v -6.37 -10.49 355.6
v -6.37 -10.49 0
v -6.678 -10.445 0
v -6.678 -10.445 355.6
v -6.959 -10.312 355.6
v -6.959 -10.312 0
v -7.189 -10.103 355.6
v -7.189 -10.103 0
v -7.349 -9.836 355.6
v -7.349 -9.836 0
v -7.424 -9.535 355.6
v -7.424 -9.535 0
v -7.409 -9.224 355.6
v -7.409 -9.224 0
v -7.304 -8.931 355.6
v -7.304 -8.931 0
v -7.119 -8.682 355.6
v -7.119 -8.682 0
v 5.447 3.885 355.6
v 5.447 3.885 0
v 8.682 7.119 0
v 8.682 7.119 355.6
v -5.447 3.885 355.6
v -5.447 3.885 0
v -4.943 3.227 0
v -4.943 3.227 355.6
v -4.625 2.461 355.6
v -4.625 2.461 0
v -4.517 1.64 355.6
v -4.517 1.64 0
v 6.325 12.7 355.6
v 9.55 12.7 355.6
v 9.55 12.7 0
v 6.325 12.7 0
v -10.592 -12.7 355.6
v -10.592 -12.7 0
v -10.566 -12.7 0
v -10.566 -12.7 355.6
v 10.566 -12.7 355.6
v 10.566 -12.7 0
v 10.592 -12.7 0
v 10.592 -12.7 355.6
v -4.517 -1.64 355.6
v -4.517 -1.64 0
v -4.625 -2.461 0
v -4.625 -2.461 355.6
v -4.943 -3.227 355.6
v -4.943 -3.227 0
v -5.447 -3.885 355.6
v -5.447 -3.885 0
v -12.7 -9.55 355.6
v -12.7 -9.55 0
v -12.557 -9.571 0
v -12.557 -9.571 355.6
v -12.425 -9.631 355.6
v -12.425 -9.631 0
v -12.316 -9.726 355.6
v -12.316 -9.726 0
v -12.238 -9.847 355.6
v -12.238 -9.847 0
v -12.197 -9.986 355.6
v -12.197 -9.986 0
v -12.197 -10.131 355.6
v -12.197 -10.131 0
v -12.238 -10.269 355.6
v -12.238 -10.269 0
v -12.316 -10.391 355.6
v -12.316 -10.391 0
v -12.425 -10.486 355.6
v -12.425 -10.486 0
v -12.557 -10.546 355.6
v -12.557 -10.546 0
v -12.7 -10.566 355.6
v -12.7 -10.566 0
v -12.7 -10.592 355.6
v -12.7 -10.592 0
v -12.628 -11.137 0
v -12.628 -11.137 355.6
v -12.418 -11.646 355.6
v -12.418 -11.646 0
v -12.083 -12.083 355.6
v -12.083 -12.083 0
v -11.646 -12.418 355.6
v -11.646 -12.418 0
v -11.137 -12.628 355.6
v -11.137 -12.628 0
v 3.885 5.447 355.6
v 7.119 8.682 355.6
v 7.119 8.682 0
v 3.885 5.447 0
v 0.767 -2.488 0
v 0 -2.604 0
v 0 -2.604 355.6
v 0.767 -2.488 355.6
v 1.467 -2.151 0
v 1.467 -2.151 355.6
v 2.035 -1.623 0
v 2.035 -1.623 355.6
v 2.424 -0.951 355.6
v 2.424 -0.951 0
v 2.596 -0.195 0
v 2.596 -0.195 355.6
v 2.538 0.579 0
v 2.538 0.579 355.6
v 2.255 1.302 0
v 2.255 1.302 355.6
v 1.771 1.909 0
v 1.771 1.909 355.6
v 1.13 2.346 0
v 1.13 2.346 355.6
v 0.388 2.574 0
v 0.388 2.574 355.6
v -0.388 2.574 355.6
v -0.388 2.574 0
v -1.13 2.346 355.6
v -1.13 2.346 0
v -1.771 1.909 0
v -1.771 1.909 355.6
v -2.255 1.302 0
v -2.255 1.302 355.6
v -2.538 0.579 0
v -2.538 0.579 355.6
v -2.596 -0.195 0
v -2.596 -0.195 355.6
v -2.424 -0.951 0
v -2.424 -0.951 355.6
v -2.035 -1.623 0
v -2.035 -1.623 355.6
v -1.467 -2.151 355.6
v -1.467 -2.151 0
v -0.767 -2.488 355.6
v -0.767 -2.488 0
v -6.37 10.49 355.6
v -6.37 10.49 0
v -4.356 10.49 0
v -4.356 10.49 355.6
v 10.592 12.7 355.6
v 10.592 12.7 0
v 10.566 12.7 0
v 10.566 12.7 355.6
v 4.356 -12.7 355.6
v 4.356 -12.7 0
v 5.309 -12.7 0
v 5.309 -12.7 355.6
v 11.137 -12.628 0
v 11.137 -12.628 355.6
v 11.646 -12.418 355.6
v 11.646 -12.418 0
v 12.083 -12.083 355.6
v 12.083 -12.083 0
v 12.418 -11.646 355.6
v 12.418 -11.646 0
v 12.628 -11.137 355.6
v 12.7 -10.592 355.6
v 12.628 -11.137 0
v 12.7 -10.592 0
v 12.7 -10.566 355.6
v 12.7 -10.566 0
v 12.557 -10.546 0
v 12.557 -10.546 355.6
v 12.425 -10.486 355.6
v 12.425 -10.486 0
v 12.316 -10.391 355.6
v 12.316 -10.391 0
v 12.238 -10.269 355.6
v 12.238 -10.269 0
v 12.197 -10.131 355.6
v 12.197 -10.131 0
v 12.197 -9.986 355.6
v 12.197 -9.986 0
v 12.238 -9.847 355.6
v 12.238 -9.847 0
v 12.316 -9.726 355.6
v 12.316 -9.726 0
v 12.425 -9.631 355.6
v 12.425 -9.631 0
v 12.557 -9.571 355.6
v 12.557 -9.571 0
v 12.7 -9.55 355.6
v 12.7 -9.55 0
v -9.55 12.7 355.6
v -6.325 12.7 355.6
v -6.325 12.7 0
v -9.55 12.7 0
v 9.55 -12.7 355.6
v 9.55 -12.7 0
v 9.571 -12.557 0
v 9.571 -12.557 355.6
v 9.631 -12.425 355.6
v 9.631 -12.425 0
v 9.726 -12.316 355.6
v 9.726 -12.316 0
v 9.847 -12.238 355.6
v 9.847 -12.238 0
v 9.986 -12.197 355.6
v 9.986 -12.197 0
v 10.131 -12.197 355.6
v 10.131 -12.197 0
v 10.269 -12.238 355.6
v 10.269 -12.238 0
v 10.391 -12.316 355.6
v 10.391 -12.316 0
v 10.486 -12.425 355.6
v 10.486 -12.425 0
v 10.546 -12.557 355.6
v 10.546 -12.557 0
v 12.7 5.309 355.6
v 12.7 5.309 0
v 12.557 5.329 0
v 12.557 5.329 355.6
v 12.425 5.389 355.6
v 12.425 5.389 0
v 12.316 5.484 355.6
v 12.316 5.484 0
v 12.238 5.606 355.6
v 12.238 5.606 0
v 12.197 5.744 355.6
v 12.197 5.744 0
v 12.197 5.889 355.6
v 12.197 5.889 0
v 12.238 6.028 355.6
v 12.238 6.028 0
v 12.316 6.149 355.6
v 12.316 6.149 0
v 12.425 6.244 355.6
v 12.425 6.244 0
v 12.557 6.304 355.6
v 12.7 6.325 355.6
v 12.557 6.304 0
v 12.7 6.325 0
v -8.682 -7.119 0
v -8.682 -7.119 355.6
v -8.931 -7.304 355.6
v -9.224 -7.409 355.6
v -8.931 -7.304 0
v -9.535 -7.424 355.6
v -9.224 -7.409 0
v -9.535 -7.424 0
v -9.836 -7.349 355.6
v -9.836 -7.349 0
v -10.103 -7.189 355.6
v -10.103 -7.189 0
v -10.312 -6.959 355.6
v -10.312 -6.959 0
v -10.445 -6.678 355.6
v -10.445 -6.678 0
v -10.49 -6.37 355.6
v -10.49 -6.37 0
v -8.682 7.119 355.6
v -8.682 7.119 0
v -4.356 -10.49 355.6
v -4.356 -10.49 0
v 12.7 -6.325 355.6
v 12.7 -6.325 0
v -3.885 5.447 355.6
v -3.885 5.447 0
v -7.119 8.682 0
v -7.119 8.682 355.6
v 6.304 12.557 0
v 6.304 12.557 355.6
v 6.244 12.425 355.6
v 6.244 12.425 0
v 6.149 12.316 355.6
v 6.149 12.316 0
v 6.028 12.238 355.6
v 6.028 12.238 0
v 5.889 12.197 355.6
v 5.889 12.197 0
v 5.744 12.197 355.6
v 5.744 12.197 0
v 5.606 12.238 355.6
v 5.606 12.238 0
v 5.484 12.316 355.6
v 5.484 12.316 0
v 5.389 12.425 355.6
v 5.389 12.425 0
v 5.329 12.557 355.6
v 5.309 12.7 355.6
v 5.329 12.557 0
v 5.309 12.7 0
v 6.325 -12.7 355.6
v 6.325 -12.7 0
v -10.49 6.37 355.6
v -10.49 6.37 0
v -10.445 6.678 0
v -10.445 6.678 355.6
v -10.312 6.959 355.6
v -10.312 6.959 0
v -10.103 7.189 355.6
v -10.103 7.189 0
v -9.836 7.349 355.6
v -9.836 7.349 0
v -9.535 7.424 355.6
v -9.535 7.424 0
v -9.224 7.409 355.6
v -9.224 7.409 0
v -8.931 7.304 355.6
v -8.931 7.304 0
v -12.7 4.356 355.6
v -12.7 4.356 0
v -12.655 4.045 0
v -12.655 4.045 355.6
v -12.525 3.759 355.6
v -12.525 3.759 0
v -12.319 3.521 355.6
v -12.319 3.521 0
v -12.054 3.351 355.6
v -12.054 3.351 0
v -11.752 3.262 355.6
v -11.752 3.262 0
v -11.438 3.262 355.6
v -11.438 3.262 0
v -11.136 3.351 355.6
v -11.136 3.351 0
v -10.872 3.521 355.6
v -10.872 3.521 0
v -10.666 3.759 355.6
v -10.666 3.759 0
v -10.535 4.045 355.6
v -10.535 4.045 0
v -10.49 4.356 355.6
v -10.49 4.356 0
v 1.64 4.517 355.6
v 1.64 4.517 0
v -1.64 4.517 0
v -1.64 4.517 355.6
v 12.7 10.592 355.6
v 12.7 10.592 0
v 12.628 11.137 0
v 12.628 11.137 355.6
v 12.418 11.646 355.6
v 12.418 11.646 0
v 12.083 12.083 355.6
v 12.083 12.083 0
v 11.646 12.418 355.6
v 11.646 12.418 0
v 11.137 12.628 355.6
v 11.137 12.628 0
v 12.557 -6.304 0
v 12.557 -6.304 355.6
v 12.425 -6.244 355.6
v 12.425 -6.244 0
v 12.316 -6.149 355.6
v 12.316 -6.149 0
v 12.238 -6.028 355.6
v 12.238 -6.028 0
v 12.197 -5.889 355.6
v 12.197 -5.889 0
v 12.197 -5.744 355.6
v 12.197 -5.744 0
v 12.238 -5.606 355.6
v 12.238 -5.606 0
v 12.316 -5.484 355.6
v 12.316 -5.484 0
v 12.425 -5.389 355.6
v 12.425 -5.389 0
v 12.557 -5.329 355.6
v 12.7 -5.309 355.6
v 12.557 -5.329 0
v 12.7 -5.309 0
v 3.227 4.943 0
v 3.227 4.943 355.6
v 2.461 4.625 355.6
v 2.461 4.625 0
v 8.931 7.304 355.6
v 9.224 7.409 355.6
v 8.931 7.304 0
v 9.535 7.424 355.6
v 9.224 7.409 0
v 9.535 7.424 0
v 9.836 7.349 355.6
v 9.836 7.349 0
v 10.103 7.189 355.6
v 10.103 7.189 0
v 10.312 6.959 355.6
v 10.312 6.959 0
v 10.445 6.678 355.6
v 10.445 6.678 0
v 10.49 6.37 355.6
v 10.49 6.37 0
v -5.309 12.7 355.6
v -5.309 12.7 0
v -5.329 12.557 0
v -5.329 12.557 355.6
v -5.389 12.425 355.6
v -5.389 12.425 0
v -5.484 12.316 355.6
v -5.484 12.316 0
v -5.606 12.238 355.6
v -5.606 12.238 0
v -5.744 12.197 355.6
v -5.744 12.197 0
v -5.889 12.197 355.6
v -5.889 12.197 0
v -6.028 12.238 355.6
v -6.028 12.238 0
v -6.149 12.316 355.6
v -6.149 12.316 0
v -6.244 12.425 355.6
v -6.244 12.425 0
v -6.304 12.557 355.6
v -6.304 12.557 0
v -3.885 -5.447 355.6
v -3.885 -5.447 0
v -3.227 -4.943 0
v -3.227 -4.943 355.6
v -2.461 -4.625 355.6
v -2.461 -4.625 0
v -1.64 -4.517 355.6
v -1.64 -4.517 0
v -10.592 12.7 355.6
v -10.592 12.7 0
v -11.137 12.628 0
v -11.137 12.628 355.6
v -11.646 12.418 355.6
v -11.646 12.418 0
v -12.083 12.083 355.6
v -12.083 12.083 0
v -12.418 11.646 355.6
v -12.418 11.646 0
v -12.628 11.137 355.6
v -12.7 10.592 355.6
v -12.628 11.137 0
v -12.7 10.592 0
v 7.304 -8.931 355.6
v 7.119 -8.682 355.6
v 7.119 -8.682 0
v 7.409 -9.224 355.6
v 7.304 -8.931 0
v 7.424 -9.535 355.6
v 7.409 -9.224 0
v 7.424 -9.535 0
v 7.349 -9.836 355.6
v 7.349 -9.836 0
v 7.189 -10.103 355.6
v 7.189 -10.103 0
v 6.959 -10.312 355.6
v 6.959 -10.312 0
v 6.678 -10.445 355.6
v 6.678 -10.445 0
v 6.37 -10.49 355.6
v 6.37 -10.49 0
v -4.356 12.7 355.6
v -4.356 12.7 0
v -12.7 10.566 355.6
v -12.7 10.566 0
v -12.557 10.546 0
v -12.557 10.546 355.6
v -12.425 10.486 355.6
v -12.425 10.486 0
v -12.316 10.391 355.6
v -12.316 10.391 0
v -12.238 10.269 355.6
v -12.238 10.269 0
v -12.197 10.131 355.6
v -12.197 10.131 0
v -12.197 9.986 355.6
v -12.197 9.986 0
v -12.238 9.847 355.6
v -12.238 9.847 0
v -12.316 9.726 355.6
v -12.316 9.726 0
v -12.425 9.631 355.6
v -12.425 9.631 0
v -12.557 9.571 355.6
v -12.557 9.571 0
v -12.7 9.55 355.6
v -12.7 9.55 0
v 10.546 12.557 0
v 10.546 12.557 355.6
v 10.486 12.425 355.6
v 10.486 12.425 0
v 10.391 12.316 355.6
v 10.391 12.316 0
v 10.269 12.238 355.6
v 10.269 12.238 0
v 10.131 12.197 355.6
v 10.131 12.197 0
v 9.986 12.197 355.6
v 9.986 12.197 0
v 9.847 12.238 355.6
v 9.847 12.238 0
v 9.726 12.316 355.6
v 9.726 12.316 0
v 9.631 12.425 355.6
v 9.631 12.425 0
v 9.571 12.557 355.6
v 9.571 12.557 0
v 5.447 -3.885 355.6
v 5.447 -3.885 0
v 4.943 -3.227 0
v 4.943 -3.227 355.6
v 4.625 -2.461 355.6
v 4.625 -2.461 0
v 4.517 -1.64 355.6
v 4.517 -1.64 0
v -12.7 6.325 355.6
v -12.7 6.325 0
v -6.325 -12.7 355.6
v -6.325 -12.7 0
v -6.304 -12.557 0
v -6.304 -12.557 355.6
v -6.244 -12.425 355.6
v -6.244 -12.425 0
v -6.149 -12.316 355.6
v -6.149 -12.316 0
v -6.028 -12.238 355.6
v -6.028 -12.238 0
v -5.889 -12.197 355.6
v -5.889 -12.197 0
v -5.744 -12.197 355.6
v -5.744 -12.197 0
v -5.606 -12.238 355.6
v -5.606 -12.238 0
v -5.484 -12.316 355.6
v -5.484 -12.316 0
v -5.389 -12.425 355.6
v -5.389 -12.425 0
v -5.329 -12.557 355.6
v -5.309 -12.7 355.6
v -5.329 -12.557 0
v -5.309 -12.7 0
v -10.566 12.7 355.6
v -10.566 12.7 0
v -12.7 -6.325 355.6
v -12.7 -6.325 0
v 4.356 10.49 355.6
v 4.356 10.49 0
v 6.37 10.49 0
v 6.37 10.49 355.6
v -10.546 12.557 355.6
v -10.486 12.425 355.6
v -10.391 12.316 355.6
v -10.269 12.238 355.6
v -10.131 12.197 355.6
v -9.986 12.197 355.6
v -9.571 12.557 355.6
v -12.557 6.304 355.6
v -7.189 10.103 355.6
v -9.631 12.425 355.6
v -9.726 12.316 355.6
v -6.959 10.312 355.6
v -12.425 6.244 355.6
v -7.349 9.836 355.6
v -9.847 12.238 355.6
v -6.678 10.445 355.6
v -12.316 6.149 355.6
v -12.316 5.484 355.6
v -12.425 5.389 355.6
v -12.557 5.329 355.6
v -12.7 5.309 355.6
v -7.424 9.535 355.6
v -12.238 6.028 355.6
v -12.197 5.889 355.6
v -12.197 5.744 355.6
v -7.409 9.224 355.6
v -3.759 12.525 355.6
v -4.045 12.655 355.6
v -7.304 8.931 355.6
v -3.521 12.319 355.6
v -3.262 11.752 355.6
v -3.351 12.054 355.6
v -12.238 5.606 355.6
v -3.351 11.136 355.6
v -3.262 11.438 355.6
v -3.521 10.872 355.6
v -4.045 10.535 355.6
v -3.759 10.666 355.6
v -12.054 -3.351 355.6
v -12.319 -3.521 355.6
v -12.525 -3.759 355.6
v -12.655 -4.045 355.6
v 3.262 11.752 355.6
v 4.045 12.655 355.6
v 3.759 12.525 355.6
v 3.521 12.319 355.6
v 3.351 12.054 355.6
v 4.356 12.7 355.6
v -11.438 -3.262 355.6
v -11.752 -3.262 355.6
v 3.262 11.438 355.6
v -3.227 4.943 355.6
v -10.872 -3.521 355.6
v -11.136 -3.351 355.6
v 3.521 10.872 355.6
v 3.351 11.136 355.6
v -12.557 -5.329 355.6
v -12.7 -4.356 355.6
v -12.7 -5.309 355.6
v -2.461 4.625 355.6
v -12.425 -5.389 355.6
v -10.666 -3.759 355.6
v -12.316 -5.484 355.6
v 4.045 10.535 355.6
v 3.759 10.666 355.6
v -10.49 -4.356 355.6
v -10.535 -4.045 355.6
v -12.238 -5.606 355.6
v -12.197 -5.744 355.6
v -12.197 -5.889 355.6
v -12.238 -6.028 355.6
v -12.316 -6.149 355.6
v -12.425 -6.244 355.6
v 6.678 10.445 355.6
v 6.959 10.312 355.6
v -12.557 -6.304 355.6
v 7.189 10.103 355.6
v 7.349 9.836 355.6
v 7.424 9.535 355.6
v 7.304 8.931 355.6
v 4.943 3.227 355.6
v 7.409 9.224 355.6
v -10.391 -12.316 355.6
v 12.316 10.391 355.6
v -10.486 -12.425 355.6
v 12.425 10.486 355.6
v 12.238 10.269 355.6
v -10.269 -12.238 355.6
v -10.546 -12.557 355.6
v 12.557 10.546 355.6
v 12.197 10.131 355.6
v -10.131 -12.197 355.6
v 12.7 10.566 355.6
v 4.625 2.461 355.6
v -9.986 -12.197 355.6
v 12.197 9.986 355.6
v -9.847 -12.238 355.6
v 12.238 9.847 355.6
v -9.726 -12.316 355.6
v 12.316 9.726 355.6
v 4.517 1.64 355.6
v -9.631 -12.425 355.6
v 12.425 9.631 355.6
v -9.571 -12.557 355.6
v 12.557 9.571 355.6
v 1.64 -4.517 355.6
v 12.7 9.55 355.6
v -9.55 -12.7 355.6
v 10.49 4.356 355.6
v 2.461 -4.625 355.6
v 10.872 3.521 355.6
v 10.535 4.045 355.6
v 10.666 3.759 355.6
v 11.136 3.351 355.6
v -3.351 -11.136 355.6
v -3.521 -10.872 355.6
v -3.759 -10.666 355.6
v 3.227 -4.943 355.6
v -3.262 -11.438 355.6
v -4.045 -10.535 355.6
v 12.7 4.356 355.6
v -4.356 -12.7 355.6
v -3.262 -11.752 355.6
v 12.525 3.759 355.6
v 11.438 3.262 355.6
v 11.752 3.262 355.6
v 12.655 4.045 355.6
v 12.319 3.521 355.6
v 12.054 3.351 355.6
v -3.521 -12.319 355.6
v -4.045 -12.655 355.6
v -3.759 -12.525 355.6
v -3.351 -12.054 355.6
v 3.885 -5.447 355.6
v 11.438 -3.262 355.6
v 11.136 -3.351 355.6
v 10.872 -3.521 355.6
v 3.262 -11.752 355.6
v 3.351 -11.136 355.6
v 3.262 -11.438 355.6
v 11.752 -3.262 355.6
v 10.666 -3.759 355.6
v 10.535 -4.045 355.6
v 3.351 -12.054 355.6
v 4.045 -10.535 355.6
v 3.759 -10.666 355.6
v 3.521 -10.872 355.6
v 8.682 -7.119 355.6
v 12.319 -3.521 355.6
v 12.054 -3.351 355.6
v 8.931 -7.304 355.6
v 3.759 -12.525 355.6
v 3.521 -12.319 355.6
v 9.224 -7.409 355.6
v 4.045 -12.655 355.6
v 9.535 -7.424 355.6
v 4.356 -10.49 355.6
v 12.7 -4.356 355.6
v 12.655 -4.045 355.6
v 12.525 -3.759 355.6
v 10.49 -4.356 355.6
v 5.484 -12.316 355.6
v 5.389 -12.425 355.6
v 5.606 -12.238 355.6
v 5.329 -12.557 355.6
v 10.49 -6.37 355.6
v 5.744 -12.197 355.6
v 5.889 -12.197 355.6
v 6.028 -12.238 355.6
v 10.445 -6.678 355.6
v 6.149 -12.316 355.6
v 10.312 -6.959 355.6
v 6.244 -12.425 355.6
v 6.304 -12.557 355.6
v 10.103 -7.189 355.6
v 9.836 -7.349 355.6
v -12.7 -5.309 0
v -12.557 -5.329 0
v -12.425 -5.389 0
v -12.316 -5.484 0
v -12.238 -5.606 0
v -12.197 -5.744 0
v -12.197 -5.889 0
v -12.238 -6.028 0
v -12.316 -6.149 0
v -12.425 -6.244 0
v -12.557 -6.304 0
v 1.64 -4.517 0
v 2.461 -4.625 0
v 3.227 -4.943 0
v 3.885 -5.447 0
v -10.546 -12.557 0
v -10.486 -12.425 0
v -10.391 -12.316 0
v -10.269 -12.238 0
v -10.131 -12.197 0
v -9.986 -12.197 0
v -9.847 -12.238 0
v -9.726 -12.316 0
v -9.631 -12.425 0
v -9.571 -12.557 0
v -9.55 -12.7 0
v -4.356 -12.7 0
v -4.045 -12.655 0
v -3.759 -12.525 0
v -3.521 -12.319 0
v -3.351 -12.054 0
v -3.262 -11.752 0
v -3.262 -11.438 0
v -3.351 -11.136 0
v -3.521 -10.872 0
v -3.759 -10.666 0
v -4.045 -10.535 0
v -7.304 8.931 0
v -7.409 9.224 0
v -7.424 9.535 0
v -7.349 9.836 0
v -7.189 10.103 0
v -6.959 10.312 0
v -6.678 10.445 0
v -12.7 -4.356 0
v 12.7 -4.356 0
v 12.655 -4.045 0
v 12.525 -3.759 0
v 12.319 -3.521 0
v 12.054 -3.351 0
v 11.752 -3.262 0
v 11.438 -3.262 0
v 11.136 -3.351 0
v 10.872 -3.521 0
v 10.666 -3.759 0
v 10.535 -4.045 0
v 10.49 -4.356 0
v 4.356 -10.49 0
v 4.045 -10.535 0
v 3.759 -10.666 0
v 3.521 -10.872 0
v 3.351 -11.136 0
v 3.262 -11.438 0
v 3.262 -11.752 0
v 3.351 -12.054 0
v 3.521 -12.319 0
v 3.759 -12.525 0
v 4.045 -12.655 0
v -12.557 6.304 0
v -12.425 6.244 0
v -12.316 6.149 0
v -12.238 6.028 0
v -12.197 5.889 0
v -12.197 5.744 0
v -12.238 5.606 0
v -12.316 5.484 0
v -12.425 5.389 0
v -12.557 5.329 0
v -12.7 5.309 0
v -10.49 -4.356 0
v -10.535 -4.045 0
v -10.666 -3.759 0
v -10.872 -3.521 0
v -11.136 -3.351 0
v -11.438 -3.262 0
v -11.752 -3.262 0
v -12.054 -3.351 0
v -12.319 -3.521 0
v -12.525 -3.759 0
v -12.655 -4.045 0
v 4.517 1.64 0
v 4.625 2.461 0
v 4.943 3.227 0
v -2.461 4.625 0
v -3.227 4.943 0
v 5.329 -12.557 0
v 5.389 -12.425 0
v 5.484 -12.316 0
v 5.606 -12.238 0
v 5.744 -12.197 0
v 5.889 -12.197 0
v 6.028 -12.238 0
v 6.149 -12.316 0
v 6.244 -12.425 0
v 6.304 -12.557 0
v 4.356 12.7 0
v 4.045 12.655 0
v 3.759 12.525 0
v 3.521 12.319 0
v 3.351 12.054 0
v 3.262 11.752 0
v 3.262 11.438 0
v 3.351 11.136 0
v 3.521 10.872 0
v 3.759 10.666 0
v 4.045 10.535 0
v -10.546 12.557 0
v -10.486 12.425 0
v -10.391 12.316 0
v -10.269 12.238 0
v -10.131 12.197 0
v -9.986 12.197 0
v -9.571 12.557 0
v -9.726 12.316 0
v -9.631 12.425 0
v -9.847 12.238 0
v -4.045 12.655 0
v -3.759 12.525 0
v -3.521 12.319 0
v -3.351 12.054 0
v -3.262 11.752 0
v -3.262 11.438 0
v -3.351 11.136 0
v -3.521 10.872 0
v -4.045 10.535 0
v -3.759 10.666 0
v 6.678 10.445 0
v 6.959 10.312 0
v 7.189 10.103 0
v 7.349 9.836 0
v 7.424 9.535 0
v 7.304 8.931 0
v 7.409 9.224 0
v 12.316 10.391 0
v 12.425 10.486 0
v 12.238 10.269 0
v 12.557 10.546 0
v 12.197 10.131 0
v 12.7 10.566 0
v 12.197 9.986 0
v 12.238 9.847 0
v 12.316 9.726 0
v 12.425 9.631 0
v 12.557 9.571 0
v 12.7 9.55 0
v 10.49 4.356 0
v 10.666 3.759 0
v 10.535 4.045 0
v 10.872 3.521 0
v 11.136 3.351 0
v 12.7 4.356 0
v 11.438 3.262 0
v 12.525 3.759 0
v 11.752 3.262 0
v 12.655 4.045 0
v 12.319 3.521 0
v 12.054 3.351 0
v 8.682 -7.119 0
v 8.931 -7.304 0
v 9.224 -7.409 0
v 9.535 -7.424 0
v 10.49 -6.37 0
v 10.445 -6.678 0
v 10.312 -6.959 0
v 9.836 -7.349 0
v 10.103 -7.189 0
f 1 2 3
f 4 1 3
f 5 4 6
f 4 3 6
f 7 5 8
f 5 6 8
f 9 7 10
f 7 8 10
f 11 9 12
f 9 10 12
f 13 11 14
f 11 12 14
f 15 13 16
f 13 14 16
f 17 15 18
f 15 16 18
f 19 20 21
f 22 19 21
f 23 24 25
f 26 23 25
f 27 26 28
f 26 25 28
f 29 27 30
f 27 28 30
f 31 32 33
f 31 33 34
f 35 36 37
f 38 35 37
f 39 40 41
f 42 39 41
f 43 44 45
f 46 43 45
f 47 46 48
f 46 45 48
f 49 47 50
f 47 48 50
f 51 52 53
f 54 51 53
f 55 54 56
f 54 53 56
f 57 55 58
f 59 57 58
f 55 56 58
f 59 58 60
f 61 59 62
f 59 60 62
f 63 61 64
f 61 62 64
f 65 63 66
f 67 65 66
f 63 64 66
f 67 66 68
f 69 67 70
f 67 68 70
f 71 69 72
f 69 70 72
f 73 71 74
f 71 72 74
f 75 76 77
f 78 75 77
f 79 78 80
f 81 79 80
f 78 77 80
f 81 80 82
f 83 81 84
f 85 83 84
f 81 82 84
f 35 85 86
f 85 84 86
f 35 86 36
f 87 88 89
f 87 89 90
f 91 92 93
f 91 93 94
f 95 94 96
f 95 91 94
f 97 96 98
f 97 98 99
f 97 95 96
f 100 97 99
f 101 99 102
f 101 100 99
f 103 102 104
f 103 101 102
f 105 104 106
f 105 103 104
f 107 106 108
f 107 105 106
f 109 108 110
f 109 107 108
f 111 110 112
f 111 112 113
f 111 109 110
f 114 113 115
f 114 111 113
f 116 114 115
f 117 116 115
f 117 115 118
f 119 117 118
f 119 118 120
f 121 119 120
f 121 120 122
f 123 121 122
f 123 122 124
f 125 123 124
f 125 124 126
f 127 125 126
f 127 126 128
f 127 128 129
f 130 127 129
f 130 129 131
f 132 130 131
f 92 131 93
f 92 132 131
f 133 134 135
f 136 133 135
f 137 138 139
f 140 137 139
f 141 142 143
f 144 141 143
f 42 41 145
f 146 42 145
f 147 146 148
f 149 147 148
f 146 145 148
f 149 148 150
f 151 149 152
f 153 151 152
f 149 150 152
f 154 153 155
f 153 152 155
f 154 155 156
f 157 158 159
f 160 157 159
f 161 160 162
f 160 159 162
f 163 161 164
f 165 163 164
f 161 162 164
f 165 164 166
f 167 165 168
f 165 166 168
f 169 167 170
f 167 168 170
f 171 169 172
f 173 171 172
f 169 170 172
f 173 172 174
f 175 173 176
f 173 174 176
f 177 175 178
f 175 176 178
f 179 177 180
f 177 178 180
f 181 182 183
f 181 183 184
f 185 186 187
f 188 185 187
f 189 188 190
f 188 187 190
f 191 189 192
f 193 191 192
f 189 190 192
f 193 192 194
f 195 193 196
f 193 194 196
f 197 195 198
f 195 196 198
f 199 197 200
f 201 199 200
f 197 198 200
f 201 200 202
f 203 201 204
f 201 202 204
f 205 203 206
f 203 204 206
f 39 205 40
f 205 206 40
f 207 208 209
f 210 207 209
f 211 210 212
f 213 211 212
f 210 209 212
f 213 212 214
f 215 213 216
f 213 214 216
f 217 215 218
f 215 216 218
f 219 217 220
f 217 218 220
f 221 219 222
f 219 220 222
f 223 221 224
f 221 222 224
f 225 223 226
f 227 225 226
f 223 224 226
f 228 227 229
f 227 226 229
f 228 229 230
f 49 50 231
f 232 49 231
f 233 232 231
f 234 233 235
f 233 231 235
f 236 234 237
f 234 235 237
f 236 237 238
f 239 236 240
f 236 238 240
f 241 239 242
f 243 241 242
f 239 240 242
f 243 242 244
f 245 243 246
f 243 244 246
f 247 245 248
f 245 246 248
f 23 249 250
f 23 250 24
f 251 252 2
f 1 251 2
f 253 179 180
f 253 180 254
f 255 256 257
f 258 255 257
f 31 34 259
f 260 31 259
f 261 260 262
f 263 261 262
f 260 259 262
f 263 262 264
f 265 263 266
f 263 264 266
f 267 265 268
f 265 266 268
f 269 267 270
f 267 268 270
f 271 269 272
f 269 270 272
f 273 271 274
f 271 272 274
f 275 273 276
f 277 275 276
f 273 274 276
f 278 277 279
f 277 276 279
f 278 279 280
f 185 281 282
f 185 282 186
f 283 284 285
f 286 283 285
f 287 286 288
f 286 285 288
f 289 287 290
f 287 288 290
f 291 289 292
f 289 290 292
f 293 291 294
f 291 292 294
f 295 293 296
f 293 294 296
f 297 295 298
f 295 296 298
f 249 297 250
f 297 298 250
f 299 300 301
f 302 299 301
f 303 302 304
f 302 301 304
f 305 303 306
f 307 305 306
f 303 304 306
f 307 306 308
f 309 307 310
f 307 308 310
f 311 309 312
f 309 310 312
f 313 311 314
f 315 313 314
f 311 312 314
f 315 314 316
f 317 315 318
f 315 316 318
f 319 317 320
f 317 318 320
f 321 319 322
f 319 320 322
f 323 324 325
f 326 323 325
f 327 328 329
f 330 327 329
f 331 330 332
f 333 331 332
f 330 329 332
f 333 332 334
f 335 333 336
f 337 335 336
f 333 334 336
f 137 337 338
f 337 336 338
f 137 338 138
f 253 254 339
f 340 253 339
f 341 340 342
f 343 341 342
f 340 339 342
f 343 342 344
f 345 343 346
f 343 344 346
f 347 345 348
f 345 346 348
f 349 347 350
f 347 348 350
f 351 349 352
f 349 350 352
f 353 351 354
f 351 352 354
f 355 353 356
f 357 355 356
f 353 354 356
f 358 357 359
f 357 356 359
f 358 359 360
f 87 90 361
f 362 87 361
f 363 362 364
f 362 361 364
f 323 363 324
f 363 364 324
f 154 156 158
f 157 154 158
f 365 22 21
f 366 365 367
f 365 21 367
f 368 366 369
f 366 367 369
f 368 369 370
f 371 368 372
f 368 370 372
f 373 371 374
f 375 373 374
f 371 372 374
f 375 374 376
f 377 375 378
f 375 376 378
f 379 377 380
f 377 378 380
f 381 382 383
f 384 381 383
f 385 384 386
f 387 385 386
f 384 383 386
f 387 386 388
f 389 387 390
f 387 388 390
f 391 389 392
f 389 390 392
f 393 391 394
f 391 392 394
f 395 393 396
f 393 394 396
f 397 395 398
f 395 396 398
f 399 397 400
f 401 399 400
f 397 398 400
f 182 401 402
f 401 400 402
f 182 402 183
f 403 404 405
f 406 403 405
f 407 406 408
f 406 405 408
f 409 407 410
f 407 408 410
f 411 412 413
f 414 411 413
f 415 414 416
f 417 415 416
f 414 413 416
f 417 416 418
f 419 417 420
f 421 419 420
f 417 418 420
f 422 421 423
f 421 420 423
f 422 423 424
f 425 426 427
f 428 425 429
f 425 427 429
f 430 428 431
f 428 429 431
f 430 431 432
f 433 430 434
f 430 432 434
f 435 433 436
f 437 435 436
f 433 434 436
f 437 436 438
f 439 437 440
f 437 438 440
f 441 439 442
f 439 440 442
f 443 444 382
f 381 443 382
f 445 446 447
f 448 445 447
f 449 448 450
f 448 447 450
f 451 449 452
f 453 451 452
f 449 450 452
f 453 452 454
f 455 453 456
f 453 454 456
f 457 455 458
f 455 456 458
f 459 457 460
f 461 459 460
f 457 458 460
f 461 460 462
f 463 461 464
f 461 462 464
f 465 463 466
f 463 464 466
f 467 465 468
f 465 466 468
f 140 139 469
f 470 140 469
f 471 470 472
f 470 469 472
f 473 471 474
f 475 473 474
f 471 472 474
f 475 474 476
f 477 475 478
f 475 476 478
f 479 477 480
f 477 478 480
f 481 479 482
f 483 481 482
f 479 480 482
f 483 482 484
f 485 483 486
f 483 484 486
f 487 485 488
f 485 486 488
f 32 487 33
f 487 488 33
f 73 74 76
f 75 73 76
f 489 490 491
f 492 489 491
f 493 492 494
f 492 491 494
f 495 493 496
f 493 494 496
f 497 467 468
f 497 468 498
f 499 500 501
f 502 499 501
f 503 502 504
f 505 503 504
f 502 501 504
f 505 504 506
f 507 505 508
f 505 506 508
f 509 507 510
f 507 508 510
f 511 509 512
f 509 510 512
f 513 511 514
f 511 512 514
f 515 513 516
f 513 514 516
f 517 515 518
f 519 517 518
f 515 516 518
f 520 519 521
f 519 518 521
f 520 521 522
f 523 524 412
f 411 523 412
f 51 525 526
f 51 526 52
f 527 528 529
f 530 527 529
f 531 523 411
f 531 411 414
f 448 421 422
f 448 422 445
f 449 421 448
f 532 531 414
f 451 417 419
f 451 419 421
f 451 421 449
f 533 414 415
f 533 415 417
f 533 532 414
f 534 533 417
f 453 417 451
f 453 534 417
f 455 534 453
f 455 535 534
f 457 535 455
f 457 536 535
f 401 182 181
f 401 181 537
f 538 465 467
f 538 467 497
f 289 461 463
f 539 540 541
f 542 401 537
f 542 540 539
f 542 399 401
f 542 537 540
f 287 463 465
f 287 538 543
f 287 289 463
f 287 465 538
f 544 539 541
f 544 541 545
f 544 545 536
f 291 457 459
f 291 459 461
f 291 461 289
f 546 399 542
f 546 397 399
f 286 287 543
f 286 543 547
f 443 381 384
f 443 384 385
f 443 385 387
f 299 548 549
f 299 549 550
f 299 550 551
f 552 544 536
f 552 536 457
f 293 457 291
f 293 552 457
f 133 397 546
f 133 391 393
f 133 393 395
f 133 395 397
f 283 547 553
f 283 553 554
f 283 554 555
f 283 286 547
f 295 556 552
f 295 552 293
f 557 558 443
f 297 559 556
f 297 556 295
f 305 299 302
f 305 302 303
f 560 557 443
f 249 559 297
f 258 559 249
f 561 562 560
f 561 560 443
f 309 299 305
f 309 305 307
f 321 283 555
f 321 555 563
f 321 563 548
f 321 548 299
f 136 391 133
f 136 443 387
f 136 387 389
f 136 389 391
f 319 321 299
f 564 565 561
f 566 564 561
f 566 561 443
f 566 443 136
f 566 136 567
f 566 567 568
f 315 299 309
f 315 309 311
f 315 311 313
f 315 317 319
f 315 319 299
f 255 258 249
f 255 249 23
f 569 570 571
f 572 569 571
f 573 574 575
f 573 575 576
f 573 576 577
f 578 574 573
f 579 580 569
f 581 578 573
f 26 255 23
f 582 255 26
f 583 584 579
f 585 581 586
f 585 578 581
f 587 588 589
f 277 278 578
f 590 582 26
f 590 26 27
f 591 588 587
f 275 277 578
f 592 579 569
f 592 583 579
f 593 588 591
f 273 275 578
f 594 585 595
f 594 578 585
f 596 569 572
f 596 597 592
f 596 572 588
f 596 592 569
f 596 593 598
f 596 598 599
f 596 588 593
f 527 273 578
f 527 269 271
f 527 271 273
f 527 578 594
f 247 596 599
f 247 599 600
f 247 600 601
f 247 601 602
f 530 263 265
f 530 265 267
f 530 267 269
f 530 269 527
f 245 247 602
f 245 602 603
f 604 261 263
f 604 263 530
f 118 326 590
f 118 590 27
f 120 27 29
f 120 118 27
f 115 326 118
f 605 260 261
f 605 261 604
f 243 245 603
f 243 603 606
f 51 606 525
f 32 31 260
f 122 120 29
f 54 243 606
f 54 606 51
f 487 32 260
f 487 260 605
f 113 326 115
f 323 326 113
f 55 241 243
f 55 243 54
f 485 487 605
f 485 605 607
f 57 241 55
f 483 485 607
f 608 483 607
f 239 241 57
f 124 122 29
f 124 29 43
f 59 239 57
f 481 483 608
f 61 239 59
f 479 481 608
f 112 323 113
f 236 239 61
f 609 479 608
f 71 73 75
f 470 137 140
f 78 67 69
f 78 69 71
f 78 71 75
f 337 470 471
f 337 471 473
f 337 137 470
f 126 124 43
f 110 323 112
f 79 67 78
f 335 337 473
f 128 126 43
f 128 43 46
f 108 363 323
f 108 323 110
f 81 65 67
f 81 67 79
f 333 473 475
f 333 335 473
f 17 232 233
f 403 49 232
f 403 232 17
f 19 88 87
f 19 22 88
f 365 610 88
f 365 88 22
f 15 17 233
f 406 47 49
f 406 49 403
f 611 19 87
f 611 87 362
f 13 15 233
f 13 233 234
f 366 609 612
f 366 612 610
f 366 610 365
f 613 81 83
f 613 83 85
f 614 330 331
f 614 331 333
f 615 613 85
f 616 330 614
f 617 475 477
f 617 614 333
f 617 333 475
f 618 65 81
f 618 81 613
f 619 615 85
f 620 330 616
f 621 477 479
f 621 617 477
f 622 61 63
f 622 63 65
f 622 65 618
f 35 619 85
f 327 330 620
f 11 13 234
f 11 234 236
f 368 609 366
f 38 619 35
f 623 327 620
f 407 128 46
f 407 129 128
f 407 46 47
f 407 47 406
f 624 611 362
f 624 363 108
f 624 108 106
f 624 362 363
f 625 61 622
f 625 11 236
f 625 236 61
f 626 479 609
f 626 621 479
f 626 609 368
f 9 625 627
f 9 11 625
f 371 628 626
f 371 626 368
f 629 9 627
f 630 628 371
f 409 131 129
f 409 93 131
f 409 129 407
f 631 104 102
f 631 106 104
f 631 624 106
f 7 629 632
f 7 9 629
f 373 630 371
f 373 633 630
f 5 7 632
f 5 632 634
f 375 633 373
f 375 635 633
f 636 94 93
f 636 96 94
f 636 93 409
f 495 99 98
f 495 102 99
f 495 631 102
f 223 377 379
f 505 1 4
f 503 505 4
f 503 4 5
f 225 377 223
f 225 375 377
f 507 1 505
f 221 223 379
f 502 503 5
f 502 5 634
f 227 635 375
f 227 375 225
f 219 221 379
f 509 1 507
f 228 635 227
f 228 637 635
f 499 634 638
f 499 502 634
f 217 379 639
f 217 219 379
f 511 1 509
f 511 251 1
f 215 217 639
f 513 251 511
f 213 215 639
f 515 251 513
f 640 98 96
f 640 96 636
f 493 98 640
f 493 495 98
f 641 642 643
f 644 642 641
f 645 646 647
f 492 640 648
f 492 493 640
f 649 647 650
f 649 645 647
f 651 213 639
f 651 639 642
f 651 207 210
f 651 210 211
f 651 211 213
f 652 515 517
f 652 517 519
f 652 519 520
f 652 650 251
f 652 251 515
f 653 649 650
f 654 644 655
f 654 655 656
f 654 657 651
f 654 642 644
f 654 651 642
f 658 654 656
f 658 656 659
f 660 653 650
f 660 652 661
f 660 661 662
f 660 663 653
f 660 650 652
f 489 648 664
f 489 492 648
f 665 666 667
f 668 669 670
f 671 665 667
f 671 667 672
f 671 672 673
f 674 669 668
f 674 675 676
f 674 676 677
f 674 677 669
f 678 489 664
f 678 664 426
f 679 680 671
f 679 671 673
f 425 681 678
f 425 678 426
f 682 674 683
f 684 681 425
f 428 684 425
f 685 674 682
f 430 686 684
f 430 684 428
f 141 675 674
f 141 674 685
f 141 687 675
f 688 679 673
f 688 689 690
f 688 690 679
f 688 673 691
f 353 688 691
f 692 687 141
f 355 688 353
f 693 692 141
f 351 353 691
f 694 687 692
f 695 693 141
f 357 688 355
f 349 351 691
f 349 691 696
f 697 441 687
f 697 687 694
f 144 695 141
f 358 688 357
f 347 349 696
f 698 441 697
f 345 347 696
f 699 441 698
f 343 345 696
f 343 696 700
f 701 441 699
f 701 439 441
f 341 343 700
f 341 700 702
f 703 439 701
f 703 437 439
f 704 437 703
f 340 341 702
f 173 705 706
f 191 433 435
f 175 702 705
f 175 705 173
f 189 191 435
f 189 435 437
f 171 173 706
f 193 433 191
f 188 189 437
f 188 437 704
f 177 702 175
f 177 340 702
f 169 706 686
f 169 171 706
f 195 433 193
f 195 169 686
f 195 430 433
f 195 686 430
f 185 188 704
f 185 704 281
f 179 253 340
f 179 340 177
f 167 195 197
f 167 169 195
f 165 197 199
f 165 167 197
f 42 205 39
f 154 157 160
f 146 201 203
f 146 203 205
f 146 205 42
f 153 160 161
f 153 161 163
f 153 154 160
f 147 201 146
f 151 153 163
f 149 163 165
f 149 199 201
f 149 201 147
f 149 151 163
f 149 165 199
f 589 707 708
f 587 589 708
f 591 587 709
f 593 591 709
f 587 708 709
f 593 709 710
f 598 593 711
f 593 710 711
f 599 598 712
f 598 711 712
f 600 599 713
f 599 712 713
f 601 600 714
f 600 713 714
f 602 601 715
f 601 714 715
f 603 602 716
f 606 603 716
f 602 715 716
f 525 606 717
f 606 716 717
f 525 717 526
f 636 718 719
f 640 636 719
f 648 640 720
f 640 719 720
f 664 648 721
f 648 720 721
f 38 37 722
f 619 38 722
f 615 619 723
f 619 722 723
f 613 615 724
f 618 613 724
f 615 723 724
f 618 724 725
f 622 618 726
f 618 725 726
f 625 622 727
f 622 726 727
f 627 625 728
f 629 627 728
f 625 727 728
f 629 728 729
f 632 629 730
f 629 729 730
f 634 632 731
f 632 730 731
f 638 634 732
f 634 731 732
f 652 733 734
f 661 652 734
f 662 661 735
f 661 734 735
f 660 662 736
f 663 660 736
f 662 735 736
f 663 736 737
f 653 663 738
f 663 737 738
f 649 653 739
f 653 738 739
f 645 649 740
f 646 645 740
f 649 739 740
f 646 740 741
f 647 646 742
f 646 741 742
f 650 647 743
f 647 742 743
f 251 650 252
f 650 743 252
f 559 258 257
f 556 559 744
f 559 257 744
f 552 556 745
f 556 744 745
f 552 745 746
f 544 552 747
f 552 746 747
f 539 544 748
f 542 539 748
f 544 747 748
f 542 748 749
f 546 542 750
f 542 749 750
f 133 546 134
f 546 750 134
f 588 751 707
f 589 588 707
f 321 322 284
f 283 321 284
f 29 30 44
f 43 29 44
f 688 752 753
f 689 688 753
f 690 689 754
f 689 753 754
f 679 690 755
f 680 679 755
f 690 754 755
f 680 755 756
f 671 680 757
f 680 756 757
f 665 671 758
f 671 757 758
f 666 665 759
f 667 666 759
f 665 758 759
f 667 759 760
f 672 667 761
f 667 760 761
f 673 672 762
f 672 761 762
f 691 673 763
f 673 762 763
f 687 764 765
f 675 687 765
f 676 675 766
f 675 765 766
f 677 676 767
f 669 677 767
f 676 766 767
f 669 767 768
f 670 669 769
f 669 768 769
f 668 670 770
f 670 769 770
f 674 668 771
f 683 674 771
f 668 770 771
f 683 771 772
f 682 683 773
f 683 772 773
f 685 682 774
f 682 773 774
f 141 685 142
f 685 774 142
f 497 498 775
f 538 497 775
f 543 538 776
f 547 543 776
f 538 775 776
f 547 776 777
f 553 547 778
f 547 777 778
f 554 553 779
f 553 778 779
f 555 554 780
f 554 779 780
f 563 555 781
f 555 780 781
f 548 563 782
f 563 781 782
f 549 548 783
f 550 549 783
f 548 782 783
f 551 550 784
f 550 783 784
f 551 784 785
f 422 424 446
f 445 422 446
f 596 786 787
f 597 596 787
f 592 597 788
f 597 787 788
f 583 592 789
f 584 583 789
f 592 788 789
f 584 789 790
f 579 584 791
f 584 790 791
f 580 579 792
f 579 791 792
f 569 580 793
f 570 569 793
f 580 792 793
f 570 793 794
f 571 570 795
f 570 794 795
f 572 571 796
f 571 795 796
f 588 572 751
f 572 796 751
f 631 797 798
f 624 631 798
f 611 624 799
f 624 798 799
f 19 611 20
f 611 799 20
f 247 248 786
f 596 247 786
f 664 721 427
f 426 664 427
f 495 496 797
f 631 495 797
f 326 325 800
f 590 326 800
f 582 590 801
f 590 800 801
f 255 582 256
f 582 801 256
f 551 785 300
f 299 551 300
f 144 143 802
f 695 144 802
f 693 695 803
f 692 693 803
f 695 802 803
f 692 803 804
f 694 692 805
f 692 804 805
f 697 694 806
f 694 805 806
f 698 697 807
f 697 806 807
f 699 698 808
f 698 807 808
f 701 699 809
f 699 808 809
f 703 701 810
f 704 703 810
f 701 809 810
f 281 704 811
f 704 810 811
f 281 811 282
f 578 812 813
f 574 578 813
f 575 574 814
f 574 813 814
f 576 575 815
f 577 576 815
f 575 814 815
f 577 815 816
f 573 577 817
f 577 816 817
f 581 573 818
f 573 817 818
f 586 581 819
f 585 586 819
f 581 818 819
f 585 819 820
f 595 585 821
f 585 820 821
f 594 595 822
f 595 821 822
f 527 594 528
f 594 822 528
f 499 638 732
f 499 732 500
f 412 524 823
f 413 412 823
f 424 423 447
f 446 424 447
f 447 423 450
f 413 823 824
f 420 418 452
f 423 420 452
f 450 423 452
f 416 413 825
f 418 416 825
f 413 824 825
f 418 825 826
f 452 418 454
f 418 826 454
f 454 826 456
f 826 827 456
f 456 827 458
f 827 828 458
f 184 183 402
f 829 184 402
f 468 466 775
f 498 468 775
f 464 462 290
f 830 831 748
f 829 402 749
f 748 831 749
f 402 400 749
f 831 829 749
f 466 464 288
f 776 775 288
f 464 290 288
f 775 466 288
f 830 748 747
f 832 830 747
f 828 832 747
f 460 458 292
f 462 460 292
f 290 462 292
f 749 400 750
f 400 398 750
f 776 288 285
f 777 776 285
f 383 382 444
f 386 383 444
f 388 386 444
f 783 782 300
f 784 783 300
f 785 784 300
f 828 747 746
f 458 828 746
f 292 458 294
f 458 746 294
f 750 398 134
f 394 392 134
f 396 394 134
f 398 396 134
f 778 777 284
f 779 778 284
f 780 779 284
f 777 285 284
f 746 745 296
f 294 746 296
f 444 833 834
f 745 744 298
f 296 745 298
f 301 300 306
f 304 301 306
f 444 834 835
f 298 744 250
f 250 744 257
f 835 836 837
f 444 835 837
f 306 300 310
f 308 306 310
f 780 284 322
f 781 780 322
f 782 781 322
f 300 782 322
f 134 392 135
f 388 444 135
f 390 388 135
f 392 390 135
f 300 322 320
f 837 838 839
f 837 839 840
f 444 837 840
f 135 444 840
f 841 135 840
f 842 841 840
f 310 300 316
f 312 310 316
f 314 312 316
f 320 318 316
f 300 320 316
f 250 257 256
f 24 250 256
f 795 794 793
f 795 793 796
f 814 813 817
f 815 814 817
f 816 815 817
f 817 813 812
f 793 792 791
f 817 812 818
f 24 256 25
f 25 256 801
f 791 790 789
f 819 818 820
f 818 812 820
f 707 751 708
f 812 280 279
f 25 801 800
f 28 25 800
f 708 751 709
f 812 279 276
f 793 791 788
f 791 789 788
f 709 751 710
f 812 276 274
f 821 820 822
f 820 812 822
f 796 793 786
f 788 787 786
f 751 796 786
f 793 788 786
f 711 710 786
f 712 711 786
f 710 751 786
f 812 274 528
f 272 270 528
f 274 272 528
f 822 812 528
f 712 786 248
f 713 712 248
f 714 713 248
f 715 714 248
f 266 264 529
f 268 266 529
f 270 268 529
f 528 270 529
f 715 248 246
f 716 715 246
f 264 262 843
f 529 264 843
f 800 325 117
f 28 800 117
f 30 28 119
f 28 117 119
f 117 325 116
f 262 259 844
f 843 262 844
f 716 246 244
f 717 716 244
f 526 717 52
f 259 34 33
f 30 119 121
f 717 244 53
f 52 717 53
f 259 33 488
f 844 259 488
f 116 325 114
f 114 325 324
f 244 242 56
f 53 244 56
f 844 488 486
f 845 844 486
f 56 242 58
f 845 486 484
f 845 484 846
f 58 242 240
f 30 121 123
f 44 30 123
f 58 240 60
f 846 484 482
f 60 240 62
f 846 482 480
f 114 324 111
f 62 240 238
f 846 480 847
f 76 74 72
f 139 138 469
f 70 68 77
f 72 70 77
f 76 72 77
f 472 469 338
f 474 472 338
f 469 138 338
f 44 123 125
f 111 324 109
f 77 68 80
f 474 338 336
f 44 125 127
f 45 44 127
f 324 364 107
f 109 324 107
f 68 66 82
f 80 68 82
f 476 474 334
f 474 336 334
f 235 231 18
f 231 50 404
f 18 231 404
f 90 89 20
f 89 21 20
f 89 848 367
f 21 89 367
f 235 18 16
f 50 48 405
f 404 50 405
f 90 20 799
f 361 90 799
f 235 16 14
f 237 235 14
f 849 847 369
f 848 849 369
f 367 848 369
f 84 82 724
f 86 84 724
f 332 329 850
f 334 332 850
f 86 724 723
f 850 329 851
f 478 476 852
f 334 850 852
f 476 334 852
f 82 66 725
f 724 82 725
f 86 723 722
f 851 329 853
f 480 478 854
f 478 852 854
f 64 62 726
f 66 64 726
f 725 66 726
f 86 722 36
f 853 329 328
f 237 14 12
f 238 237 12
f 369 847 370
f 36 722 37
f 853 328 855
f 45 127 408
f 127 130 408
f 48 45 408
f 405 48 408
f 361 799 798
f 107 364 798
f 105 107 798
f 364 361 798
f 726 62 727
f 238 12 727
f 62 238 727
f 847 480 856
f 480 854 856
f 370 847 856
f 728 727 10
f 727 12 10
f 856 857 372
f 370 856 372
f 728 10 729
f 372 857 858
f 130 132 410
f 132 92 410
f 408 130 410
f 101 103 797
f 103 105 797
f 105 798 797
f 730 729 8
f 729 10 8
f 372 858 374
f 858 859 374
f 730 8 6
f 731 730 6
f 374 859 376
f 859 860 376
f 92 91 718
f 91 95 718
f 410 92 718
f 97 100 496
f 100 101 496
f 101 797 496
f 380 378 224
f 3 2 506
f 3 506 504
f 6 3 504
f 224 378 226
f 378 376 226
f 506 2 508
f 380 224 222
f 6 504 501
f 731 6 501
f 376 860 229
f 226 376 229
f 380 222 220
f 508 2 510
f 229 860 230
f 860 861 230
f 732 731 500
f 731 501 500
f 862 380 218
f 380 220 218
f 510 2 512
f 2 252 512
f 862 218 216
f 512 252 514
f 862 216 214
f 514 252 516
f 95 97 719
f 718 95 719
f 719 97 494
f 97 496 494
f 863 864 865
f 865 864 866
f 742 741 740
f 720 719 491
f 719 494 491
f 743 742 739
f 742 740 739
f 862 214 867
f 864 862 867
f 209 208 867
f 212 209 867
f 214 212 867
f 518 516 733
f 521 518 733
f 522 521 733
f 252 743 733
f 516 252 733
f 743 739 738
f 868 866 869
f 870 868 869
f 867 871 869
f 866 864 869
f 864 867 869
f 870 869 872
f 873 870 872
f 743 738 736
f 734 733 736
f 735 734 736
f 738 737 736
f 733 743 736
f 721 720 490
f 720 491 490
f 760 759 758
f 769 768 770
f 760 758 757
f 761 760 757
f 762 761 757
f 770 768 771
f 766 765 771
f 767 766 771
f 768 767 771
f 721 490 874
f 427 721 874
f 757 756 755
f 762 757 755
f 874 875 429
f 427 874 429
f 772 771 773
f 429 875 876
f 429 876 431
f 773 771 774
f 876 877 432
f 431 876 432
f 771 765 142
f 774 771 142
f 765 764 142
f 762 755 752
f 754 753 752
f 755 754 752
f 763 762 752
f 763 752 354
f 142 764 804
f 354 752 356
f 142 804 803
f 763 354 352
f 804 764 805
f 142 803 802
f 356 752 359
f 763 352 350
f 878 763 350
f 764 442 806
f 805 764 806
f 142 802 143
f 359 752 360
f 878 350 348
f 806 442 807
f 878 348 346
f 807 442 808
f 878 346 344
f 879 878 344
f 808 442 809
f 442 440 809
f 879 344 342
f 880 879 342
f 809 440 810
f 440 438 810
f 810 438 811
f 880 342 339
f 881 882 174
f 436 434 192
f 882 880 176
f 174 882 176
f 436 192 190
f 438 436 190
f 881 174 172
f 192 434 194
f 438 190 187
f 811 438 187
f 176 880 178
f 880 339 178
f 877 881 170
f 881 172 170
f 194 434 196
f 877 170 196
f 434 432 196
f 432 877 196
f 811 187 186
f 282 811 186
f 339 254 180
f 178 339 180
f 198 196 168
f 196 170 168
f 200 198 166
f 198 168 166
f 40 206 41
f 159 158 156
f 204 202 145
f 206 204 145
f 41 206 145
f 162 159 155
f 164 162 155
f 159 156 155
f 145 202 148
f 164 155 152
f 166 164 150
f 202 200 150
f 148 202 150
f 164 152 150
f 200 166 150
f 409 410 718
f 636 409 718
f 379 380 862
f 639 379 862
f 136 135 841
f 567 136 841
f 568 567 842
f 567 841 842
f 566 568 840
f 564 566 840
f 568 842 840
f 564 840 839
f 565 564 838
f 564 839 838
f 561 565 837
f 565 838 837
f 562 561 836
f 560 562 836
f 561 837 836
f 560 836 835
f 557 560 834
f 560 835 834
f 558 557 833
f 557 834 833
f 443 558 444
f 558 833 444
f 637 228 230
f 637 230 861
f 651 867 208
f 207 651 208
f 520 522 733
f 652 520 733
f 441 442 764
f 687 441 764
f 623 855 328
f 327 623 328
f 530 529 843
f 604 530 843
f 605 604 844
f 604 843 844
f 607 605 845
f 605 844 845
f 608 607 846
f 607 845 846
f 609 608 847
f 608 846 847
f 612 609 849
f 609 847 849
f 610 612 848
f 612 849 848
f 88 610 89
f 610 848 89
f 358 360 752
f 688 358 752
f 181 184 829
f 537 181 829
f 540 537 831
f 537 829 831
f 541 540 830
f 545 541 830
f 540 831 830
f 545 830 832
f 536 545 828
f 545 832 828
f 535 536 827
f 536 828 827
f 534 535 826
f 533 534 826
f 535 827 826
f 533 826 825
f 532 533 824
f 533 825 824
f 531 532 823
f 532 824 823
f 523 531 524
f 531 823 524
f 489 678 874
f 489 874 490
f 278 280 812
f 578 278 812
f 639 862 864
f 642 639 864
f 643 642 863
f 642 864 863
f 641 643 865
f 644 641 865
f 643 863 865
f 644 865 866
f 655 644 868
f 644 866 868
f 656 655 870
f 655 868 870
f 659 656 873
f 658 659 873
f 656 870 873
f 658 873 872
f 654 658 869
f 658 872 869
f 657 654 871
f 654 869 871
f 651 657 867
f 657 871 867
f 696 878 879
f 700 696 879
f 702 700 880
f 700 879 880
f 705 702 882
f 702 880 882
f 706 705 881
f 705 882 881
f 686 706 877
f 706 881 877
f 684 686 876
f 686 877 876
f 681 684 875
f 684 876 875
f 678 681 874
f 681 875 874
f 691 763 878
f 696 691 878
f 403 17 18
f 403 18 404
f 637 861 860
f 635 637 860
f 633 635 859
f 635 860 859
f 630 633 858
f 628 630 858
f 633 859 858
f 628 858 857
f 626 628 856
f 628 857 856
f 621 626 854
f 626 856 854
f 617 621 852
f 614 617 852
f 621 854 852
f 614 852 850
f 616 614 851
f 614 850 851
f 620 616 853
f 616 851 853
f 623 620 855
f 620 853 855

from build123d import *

# Parameters (mm, degrees)
SKETCH11_R              = 2.6035
FRACTIONAL_1010_1_DEPTH = 355.6


with BuildPart() as part:
    # Sketch11 → Fractional 1010(1) (new body)
    with BuildSketch(Plane(origin=(0, 0, 0), x_dir=(0, -1, 0), z_dir=(0, 0, 1))):
        with BuildLine():
            Line((10.5918, 12.7), (10.5664, 12.7))
            ThreePointArc((10.5664, 12.7), (10.0584, 12.192), (9.5504, 12.7))
            Line((9.5504, 12.7), (6.3246, 12.7))
            ThreePointArc((6.3246, 12.7), (5.8166, 12.192), (5.3086, 12.7))
            Line((5.3086, 12.7), (4.3561, 12.7))
            ThreePointArc((4.3561, 12.7), (3.2512, 11.5951), (4.3561, 10.4902))
            Line((4.3561, 10.4902), (6.370083786, 10.4902))
            ThreePointArc((6.370083786, 10.4902), (7.348856743, 9.836204819), (7.119204175, 8.681663397))
            Line((7.119204175, 8.681663397), (3.88464389, 5.447103113))
            ThreePointArc((3.88464389, 5.447103113), (2.854599758, 4.758849627), (1.63957986, 4.517167143))
            Line((1.63957986, 4.517167143), (-1.63957986, 4.517167143))
            ThreePointArc((-1.63957986, 4.517167143), (-2.854599758, 4.758849627), (-3.88464389, 5.447103113))
            Line((-3.88464389, 5.447103113), (-7.119204175, 8.681663397))
            ThreePointArc((-7.119204175, 8.681663397), (-7.348856743, 9.836204819), (-6.370083786, 10.4902))
            Line((-6.370083786, 10.4902), (-4.3561, 10.4902))
            ThreePointArc((-4.3561, 10.4902), (-3.2512, 11.5951), (-4.3561, 12.7))
            Line((-4.3561, 12.7), (-5.3086, 12.7))
            ThreePointArc((-5.3086, 12.7), (-5.8166, 12.192), (-6.3246, 12.7))
            Line((-6.3246, 12.7), (-9.5504, 12.7))
            ThreePointArc((-9.5504, 12.7), (-10.0584, 12.192), (-10.5664, 12.7))
            Line((-10.5664, 12.7), (-10.5918, 12.7))
            ThreePointArc((-10.5918, 12.7), (-12.082522516, 12.082522516), (-12.7, 10.5918))
            Line((-12.7, 10.5918), (-12.7, 10.5664))
            ThreePointArc((-12.7, 10.5664), (-12.192, 10.0584), (-12.7, 9.5504))
            Line((-12.7, 9.5504), (-12.7, 6.3246))
            ThreePointArc((-12.7, 6.3246), (-12.192, 5.8166), (-12.7, 5.3086))
            Line((-12.7, 5.3086), (-12.7, 4.3561))
            ThreePointArc((-12.7, 4.3561), (-11.5951, 3.2512), (-10.4902, 4.3561))
            Line((-10.4902, 4.3561), (-10.4902, 6.370083786))
            ThreePointArc((-10.4902, 6.370083786), (-9.836204819, 7.348856743), (-8.681663397, 7.119204175))
            Line((-8.681663397, 7.119204175), (-5.447103113, 3.88464389))
            ThreePointArc((-5.447103113, 3.88464389), (-4.758849627, 2.854599758), (-4.517167143, 1.63957986))
            Line((-4.517167143, 1.63957986), (-4.517167143, -1.63957986))
            ThreePointArc((-4.517167143, -1.63957986), (-4.758849627, -2.854599758), (-5.447103113, -3.88464389))
            Line((-5.447103113, -3.88464389), (-8.681663397, -7.119204175))
            ThreePointArc((-8.681663397, -7.119204175), (-9.836204819, -7.348856743), (-10.4902, -6.370083786))
            Line((-10.4902, -6.370083786), (-10.4902, -4.3561))
            ThreePointArc((-10.4902, -4.3561), (-11.5951, -3.2512), (-12.7, -4.3561))
            Line((-12.7, -4.3561), (-12.7, -5.3086))
            ThreePointArc((-12.7, -5.3086), (-12.192, -5.8166), (-12.7, -6.3246))
            Line((-12.7, -6.3246), (-12.7, -9.5504))
            ThreePointArc((-12.7, -9.5504), (-12.192, -10.0584), (-12.7, -10.5664))
            Line((-12.7, -10.5664), (-12.7, -10.5918))
            ThreePointArc((-12.7, -10.5918), (-12.082522516, -12.082522516), (-10.5918, -12.7))
            Line((-10.5918, -12.7), (-10.5664, -12.7))
            ThreePointArc((-10.5664, -12.7), (-10.0584, -12.192), (-9.5504, -12.7))
            Line((-9.5504, -12.7), (-6.3246, -12.7))
            ThreePointArc((-6.3246, -12.7), (-5.8166, -12.192), (-5.3086, -12.7))
            Line((-5.3086, -12.7), (-4.3561, -12.7))
            ThreePointArc((-4.3561, -12.7), (-3.2512, -11.5951), (-4.3561, -10.4902))
            Line((-4.3561, -10.4902), (-6.370083786, -10.4902))
            ThreePointArc((-6.370083786, -10.4902), (-7.348856743, -9.836204819), (-7.119204175, -8.681663397))
            Line((-7.119204175, -8.681663397), (-3.88464389, -5.447103113))
            ThreePointArc((-3.88464389, -5.447103113), (-2.854599758, -4.758849627), (-1.63957986, -4.517167143))
            Line((-1.63957986, -4.517167143), (1.63957986, -4.517167143))
            ThreePointArc((1.63957986, -4.517167143), (2.854599758, -4.758849627), (3.88464389, -5.447103113))
            Line((3.88464389, -5.447103113), (7.119204175, -8.681663397))
            ThreePointArc((7.119204175, -8.681663397), (7.348856743, -9.836204819), (6.370083786, -10.4902))
            Line((6.370083786, -10.4902), (4.3561, -10.4902))
            ThreePointArc((4.3561, -10.4902), (3.2512, -11.5951), (4.3561, -12.7))
            Line((4.3561, -12.7), (5.3086, -12.7))
            ThreePointArc((5.3086, -12.7), (5.8166, -12.192), (6.3246, -12.7))
            Line((6.3246, -12.7), (9.5504, -12.7))
            ThreePointArc((9.5504, -12.7), (10.0584, -12.192), (10.5664, -12.7))
            Line((10.5664, -12.7), (10.5918, -12.7))
            ThreePointArc((10.5918, -12.7), (12.082522516, -12.082522516), (12.7, -10.5918))
            Line((12.7, -10.5918), (12.7, -10.5664))
            ThreePointArc((12.7, -10.5664), (12.192, -10.0584), (12.7, -9.5504))
            Line((12.7, -9.5504), (12.7, -6.3246))
            ThreePointArc((12.7, -6.3246), (12.192, -5.8166), (12.7, -5.3086))
            Line((12.7, -5.3086), (12.7, -4.3561))
            ThreePointArc((12.7, -4.3561), (11.5951, -3.2512), (10.4902, -4.3561))
            Line((10.4902, -4.3561), (10.4902, -6.370083786))
            ThreePointArc((10.4902, -6.370083786), (9.836204819, -7.348856743), (8.681663397, -7.119204175))
            Line((8.681663397, -7.119204175), (5.447103113, -3.88464389))
            ThreePointArc((5.447103113, -3.88464389), (4.758849627, -2.854599758), (4.517167143, -1.63957986))
            Line((4.517167143, -1.63957986), (4.517167143, 1.63957986))
            ThreePointArc((4.517167143, 1.63957986), (4.758849627, 2.854599758), (5.447103113, 3.88464389))
            Line((5.447103113, 3.88464389), (8.681663397, 7.119204175))
            ThreePointArc((8.681663397, 7.119204175), (9.836204819, 7.348856743), (10.4902, 6.370083786))
            Line((10.4902, 6.370083786), (10.4902, 4.3561))
            ThreePointArc((10.4902, 4.3561), (11.5951, 3.2512), (12.7, 4.3561))
            Line((12.7, 4.3561), (12.7, 5.3086))
            ThreePointArc((12.7, 5.3086), (12.192, 5.8166), (12.7, 6.3246))
            Line((12.7, 6.3246), (12.7, 9.5504))
            ThreePointArc((12.7, 9.5504), (12.192, 10.0584), (12.7, 10.5664))
            Line((12.7, 10.5664), (12.7, 10.5918))
            ThreePointArc((12.7, 10.5918), (12.082522516, 12.082522516), (10.5918, 12.7))
        make_face()
        Circle(SKETCH11_R, mode=Mode.SUBTRACT)
    extrude(amount=FRACTIONAL_1010_1_DEPTH)


solid = part.part
